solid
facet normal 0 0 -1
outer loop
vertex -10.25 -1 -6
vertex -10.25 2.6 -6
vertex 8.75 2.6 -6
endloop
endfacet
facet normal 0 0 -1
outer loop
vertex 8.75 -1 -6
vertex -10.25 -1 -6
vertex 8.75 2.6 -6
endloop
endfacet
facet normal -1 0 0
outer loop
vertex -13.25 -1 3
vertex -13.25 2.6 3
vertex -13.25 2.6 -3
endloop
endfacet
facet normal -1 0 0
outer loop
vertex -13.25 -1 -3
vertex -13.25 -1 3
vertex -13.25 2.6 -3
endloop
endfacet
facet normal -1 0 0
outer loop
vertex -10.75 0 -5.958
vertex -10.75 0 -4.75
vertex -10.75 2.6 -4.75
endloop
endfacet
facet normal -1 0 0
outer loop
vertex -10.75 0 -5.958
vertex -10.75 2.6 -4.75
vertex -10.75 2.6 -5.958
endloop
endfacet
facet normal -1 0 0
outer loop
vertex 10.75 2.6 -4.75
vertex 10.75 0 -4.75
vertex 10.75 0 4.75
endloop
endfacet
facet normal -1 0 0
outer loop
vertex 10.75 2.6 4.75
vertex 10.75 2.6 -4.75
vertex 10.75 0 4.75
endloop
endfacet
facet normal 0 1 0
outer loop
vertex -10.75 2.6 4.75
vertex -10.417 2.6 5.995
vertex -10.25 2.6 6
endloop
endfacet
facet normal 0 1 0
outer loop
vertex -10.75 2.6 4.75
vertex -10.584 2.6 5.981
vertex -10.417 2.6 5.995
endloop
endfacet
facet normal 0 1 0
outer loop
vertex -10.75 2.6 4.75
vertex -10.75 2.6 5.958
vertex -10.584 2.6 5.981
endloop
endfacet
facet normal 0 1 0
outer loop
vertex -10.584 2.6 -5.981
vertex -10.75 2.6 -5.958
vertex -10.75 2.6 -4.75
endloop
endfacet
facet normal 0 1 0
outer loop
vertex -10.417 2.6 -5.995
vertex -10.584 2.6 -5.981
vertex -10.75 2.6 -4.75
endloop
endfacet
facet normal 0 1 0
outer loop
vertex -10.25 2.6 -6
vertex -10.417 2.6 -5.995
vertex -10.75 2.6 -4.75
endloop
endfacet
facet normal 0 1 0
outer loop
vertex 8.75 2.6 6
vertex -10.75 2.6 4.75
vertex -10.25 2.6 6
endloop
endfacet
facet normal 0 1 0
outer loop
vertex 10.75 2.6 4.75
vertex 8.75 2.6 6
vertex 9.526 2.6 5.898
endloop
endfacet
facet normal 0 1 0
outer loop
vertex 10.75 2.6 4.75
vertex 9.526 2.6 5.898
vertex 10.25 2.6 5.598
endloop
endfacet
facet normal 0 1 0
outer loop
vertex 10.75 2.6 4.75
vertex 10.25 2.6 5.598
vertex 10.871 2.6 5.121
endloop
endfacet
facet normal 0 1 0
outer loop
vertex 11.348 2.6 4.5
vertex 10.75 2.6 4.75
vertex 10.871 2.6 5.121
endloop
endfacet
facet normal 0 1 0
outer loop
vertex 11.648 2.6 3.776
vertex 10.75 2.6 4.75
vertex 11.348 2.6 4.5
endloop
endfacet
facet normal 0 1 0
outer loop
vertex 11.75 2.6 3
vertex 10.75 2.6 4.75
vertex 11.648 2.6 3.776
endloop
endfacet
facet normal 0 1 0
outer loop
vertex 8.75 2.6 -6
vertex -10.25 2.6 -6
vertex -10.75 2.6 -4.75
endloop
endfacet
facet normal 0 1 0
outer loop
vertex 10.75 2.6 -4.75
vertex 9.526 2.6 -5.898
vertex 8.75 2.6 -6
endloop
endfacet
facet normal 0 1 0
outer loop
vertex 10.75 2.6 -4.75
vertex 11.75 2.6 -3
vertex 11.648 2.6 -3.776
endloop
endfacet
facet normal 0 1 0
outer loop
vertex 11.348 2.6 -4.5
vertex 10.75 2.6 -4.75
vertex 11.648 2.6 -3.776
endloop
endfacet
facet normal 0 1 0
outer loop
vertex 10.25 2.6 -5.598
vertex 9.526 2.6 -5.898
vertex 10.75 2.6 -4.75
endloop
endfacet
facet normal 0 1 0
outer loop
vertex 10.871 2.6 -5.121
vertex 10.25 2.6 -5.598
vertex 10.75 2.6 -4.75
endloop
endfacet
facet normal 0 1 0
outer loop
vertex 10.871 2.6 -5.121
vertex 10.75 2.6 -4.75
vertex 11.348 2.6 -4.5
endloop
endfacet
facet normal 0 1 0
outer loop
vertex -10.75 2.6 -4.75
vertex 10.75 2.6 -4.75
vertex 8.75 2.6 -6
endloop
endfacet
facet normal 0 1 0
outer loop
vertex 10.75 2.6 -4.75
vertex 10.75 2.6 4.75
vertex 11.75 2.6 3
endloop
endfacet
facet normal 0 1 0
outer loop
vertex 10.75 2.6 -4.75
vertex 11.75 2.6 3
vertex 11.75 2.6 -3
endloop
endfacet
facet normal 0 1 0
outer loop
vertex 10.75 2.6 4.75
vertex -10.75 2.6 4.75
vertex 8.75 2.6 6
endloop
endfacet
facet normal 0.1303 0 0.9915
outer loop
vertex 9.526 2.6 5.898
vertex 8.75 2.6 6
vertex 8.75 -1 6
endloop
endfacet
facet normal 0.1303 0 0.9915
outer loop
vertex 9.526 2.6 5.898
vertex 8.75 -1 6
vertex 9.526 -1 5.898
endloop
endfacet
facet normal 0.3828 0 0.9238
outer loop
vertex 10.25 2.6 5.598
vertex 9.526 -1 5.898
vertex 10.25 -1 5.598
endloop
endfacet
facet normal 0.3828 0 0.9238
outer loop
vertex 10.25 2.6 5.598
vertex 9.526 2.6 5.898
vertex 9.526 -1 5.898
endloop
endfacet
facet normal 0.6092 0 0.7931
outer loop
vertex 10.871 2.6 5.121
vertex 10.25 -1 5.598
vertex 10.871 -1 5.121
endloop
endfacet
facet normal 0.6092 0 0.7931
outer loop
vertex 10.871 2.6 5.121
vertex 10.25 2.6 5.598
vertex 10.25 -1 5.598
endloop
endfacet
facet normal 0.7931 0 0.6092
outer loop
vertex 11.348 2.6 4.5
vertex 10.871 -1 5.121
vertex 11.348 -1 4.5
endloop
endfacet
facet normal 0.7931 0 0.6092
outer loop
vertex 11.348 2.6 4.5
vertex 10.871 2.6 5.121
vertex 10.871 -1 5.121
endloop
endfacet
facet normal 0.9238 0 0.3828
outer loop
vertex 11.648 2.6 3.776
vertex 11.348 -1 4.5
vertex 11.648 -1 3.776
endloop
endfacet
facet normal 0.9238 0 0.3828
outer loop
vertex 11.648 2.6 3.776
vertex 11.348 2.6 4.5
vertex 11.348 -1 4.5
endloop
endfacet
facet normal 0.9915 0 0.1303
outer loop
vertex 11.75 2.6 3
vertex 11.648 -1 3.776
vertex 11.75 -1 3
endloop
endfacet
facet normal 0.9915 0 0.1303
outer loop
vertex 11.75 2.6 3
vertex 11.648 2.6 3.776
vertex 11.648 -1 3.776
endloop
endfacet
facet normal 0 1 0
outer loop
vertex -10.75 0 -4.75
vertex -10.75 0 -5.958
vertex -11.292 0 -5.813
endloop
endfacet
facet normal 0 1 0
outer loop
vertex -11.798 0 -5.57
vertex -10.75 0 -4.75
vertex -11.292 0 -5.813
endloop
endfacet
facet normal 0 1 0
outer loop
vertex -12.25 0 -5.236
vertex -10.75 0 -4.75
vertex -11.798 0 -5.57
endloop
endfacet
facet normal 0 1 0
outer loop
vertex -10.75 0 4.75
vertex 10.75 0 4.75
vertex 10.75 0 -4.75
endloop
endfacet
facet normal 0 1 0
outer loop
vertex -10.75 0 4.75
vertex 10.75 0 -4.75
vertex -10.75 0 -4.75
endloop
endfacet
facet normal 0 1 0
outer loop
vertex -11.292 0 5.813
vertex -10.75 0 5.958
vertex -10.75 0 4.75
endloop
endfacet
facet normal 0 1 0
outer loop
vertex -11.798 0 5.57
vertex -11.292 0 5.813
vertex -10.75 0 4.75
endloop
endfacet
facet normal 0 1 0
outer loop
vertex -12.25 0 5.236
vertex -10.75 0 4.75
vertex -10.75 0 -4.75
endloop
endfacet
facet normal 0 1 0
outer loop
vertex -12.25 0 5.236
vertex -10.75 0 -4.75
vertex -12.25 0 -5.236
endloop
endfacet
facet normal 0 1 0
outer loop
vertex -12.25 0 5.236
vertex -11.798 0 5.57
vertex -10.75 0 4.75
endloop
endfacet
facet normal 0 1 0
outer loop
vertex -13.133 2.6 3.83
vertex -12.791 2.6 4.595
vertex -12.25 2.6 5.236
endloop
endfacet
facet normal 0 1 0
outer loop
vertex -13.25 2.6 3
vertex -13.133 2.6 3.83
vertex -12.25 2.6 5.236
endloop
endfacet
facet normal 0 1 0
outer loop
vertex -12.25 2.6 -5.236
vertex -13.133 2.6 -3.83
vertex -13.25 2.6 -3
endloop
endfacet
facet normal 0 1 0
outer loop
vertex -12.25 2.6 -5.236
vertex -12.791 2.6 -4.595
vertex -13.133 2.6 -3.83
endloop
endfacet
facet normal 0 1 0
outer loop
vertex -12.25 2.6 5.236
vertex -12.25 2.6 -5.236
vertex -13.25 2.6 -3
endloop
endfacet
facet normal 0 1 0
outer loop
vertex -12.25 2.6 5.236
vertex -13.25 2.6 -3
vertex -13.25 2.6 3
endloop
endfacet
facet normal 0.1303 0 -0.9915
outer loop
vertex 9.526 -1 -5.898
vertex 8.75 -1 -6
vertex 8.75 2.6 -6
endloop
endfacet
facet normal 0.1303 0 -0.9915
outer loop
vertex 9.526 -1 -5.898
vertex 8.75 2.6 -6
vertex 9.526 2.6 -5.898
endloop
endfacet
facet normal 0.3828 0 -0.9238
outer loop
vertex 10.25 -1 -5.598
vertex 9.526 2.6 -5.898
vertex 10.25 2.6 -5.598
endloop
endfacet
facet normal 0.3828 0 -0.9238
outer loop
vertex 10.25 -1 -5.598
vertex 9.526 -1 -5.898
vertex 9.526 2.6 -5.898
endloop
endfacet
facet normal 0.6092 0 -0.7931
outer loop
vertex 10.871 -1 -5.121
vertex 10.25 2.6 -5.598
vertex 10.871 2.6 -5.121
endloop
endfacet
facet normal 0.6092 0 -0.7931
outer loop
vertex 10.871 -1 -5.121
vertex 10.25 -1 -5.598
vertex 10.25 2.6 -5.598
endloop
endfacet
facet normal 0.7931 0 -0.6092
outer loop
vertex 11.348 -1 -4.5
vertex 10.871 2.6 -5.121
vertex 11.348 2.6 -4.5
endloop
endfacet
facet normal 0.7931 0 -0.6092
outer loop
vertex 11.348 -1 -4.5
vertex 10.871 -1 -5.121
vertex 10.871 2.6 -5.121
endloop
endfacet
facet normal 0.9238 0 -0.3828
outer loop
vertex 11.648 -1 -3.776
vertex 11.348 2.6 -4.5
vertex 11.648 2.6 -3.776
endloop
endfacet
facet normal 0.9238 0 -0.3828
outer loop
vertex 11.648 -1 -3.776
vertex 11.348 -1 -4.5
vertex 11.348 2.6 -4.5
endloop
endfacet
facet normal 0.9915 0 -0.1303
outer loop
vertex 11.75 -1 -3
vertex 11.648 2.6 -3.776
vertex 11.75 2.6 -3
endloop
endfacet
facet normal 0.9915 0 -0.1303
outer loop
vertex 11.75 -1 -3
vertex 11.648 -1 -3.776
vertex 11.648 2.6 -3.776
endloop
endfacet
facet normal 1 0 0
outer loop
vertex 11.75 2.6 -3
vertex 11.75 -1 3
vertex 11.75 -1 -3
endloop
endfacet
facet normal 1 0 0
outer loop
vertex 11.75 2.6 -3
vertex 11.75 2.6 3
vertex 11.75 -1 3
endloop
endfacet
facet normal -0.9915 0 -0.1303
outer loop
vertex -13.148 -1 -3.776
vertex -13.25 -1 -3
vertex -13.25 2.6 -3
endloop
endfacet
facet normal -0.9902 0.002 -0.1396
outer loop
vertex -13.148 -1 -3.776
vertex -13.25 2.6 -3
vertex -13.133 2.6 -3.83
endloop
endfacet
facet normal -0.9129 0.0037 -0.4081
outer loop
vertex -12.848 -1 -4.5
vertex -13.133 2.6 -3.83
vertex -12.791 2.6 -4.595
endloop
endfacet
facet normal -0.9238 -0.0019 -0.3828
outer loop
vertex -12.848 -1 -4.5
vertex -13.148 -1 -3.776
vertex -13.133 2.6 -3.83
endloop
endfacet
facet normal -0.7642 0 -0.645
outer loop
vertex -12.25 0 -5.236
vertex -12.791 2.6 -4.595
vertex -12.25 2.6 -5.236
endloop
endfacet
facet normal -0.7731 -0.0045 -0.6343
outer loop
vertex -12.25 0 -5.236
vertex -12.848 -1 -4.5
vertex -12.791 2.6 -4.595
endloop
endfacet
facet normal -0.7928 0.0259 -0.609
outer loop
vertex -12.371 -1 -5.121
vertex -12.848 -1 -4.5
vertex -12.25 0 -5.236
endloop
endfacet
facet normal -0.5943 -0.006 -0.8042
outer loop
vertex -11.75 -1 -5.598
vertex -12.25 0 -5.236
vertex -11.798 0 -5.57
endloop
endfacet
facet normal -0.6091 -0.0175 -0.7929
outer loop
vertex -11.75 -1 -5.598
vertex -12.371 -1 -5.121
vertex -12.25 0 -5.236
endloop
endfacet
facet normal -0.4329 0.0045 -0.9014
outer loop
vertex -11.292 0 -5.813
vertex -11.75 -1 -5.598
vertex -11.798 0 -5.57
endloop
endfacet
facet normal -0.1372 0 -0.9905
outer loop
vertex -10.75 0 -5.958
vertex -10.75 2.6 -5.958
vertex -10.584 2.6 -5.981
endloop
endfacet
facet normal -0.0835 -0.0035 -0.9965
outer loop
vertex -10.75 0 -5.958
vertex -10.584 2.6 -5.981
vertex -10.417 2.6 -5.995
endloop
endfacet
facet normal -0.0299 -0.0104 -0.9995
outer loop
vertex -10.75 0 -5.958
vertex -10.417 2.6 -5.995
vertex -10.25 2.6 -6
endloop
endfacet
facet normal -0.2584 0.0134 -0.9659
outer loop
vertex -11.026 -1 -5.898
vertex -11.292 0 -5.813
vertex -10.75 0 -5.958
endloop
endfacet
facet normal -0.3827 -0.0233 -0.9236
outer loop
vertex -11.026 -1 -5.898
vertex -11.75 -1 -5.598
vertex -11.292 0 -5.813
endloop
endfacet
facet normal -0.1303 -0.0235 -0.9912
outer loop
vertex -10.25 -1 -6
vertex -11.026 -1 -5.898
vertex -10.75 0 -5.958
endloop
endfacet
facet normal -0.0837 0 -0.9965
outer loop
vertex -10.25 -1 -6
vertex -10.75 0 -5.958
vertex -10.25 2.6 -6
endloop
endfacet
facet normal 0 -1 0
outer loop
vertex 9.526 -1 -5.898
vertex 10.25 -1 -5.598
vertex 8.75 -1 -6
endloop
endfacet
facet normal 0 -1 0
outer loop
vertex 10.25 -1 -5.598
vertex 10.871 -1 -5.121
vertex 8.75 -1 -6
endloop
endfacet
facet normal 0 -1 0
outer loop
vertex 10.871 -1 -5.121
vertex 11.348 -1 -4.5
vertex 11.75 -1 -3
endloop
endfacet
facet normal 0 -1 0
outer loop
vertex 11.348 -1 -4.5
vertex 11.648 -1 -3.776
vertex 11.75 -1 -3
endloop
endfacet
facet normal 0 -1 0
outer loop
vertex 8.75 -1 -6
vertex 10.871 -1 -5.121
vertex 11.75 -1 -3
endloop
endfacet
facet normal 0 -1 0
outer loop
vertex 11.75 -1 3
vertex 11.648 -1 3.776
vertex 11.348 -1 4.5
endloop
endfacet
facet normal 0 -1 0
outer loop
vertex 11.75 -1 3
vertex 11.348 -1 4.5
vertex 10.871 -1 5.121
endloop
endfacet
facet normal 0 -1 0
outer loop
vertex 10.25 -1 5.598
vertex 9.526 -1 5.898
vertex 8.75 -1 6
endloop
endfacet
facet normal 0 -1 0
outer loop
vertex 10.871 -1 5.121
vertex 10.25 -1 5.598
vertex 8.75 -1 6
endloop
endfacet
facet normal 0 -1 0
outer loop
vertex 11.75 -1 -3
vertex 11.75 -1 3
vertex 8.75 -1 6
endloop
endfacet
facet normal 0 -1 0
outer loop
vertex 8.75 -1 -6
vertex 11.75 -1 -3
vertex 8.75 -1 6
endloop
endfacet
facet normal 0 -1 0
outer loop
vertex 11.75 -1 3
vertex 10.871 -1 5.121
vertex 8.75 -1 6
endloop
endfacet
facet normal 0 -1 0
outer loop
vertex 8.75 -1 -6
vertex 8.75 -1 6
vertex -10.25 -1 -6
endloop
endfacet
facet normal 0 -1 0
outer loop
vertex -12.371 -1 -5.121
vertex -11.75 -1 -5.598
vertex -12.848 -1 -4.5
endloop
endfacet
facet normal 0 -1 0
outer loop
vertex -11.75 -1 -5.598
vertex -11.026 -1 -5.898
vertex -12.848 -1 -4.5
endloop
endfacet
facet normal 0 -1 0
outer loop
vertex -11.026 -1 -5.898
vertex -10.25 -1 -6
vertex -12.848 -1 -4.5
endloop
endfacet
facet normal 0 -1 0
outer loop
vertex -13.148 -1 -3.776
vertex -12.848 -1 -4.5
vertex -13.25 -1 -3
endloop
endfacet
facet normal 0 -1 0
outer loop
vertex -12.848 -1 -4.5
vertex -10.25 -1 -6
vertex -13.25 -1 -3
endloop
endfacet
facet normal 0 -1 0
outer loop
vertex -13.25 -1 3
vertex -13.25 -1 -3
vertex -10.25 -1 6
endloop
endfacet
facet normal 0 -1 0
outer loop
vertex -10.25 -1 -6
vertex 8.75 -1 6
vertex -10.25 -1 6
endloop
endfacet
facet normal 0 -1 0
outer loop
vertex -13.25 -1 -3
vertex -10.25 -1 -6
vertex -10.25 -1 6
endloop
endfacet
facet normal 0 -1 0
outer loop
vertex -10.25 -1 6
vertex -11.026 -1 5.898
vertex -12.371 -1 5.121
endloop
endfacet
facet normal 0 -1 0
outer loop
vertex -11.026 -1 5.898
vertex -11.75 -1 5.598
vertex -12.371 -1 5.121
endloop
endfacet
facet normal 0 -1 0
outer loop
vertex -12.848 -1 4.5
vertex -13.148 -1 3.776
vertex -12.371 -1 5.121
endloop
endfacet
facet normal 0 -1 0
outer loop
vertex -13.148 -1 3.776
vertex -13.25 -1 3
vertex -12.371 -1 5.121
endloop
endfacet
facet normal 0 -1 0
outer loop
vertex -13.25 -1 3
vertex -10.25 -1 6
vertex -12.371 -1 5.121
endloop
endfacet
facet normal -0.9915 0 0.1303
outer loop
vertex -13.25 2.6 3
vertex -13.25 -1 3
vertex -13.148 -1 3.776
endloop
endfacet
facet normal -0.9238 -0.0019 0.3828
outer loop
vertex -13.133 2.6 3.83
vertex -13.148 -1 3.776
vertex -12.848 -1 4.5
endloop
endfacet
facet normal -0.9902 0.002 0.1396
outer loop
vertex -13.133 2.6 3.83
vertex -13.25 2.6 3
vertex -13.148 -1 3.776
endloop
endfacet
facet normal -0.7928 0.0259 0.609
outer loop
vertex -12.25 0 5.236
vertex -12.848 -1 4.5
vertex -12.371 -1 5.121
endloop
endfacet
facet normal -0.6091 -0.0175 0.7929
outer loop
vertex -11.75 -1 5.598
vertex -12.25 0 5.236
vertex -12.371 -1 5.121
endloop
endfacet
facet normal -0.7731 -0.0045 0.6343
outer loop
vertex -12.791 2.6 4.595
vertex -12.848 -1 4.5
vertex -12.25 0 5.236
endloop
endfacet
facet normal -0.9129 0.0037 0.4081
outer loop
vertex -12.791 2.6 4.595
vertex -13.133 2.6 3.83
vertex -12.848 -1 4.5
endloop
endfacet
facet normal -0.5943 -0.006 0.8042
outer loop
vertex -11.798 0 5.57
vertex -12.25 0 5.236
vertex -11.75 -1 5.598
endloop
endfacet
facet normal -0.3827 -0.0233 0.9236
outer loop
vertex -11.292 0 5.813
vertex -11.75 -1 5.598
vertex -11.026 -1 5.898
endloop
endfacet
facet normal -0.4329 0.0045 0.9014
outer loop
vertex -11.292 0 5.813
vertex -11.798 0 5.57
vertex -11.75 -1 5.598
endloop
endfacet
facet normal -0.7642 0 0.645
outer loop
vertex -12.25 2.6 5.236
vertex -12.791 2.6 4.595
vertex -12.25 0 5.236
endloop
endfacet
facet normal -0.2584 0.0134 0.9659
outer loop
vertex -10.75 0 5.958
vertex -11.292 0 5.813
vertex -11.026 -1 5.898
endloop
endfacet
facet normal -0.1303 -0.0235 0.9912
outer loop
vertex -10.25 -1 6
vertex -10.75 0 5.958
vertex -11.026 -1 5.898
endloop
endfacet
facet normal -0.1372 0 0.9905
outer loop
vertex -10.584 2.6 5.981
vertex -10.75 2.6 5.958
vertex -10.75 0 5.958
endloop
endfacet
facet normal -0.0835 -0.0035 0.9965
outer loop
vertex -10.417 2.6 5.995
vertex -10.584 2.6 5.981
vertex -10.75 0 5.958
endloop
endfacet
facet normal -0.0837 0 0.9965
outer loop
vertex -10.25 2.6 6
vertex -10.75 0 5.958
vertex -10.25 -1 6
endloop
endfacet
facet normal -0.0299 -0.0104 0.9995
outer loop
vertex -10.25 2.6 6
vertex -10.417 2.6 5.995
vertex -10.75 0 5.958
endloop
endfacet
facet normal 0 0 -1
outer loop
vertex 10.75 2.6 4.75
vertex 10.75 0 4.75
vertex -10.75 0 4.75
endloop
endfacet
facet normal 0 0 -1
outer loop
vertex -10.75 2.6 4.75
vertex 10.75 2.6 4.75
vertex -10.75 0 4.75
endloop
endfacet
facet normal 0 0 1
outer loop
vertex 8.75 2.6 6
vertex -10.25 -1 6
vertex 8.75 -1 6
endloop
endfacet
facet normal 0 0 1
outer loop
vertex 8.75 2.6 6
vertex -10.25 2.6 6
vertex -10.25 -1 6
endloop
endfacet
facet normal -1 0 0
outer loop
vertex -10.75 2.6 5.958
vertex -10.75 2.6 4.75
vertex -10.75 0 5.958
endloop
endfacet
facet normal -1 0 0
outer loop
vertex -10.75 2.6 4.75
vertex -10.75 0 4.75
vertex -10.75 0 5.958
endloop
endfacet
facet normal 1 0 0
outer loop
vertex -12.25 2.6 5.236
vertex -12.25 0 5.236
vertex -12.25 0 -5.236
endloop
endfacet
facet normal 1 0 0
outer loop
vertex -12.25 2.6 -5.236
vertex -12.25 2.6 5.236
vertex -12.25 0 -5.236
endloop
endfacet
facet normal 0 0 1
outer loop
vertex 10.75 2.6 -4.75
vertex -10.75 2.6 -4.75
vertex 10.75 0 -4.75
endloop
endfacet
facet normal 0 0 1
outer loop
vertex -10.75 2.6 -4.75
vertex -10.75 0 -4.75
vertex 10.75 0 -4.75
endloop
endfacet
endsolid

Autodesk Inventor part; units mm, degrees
ref_plane "YZ Plane" through (0, 0, 0) normal (1, 0, 0) x (0, 1, 0)
ref_plane "XZ Plane" through (0, 0, 0) normal (0, 1, 0) x (-1, 0, 0)
ref_plane "XY Plane" through (0, 0, 0) normal (0, 0, 1) x (1, 0, 0)
sketch "Sketch1" plane through (0, 0, 0) normal (0, 1, 0) x (-1, 0, 0)
  line L0 (10.75, 4.75) -> (-10.75, 4.75) construction
  line L1 (10.75, -4.75) -> (-10.75, -4.75) construction
  line L2 (13.25, 6) -> (13.25, -6)
  line L3 (0, 4.75) -> (0, -4.75) construction
  line L4 (-11.75, 6) -> (-11.75, -6)
  line L5 (-10.75, 4.75) -> (-10.75, -4.75) construction
  line L6 (10.75, 4.75) -> (10.75, -4.75) construction
  line L7 (13.25, 6) -> (-11.75, 6)
  line L8 (13.25, -6) -> (-11.75, -6)
  point P0 (0, 0)
  point P1 (13.25, 0)
  point P2 (0, 0)
  point P3 (0, -4.75)
  point P4 (-11.75, 0)
  dimension "d0" = 9.5
  dimension "d1" = 25
  dimension "d2" = 21.5
  dimension "d3" = 12
  dimension "d4" = 1
extrude "Extrusion1" add sketch "Sketch1" against normal blind 1
sketch "Sketch2" plane through (0, 0, 0) normal (0, 1, 0) x (1, 0, 0)
  line L0 (-10.75, 4.75) -> (10.75, 4.75)
  line L1 (-13.25, 6) -> (11.75, 6) projected
  line L2 (10.75, 4.75) -> (10.75, -4.75)
  line L3 (10.75, -4.75) -> (-10.75, -4.75)
  line L4 (-10.75, -4.75) -> (-10.75, -6.052)
  line L5 (-10.75, 4.75) -> (-10.75, 6)
  line L6 (-12.25, -6.052) -> (-12.25, 6)
  line L7 (-13.25, 6) -> (-13.25, -6) projected
  line L8 (-13.25, -6) -> (-13.25, 6) projected
  line L9 (-13.25, -6) -> (-12.25, -6)
  line L10 (-10.75, -6) -> (11.75, -6)
  line L11 (-13.25, 6) -> (-12.25, 6)
  line L12 (-10.75, 6) -> (11.75, 6)
  line L13 (11.75, 6) -> (11.75, -6) projected
  line L14 (11.75, -6) -> (11.75, 6)
  point P0 (0, 0)
  dimension "d7" = 1
extrude "Extrusion2" add sketch "Sketch2" along normal blind 2.6
fillet "Fillet1" radius 3 2 edges at (11.75, 0.8, 6) (11.75, 0.8, -6)
fillet "Fillet2" radius 3 2 edges at (-13.25, 0.8, -6) (-13.25, 0.8, 6)
properties part number "HeadphoneThingy"
